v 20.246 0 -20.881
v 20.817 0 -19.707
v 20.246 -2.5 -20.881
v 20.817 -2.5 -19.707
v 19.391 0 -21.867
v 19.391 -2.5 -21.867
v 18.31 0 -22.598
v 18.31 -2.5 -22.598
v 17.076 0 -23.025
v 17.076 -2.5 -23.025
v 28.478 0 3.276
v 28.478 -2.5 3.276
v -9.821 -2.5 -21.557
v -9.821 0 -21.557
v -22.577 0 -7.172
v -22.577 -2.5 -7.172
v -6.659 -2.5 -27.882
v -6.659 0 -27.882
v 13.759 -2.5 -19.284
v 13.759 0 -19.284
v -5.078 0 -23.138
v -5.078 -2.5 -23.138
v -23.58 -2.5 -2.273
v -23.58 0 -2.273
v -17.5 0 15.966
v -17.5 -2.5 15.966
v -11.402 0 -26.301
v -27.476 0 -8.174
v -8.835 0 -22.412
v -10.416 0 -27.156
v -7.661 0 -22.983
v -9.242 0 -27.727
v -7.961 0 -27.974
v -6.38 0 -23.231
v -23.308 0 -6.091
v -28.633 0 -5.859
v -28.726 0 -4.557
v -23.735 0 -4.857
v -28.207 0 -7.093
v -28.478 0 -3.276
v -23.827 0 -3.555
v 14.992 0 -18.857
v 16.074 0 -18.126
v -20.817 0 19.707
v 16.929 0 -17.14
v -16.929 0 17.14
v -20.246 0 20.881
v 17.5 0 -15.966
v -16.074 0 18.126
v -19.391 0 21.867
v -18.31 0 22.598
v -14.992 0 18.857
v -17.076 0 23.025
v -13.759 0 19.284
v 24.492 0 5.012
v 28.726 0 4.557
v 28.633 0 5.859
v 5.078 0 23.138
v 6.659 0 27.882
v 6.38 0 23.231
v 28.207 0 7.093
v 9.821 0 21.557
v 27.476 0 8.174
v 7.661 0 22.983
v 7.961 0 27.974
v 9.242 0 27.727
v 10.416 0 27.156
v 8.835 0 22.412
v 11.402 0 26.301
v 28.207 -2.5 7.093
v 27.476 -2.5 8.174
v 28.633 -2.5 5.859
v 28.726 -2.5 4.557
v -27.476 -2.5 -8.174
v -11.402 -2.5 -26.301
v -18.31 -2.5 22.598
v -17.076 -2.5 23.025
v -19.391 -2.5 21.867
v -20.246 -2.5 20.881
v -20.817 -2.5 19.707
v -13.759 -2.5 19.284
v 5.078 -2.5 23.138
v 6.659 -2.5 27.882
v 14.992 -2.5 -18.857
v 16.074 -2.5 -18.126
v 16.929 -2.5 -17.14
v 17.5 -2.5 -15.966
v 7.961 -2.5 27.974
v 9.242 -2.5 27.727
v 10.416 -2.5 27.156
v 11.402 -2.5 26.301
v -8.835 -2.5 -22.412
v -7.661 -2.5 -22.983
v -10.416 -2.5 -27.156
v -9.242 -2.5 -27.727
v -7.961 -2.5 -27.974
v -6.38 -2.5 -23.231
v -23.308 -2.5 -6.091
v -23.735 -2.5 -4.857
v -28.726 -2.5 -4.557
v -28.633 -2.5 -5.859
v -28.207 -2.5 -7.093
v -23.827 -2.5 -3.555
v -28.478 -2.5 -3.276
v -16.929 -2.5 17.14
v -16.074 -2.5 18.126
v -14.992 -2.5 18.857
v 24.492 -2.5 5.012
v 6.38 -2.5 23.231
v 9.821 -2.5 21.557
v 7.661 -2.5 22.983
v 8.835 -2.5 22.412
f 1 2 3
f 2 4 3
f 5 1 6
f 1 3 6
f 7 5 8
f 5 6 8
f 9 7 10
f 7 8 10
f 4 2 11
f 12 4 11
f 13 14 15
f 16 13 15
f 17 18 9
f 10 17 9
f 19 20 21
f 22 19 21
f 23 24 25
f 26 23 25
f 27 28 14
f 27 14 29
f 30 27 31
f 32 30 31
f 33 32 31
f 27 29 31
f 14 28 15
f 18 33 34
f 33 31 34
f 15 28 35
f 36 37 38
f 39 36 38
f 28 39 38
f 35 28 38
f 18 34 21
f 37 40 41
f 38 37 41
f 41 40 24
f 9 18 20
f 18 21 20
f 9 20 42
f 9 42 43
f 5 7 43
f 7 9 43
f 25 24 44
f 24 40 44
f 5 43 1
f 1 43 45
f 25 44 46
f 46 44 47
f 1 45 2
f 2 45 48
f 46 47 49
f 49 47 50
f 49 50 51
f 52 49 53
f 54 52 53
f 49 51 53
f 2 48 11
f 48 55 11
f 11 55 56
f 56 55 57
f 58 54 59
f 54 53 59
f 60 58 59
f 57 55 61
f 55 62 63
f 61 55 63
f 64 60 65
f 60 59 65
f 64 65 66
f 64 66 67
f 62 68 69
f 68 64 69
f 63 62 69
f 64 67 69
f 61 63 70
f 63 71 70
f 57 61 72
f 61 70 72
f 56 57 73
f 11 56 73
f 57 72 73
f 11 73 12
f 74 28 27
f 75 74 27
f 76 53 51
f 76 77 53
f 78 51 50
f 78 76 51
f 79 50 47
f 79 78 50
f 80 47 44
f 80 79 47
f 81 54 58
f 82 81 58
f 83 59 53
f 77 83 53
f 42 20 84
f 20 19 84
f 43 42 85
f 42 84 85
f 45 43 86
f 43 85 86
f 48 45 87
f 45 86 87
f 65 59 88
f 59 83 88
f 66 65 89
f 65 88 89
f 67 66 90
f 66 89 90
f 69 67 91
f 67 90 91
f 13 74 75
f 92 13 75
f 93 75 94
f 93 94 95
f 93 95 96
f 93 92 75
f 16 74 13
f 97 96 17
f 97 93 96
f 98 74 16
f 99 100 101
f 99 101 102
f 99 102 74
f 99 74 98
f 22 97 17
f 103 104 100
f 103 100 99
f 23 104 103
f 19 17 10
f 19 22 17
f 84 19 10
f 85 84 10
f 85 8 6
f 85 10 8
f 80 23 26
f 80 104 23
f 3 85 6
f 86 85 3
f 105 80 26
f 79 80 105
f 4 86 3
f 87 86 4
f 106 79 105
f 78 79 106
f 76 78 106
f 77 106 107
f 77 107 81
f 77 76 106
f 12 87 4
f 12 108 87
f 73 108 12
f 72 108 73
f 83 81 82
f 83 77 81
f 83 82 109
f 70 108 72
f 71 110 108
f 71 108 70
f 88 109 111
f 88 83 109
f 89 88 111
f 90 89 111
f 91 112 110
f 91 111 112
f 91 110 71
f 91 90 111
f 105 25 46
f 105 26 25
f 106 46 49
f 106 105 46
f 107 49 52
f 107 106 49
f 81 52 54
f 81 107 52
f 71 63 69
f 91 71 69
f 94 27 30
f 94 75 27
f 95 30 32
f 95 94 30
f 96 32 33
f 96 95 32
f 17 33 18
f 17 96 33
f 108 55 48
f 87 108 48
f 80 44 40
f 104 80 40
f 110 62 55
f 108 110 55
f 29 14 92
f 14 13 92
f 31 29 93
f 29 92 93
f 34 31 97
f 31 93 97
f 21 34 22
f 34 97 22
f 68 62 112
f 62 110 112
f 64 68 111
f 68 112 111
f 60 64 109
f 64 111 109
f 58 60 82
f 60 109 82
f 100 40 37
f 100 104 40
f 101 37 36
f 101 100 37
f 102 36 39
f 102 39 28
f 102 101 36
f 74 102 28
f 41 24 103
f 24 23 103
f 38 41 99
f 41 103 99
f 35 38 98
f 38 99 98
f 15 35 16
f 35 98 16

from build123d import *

# Parameters (mm, degrees)
F1_DEPTH = 2.5
F2_R     = 5
F3_R     = 5


with BuildPart() as f1:
    # F0 (on Front) → F1 (new body)
    with BuildSketch(Plane.XZ):
        Polygon((9.486825, 28.460502), (-19.904105, 22.446082), (-29.39093, -6.014419), (-9.486825, -28.460502), (19.904105, -22.446082), (29.39093, 6.014419), align=None)
        Polygon((-16.586754, 18.705069), (7.905688, 23.717085), (24.492442, 5.012016), (16.586754, -18.705069), (-7.905688, -23.717085), (-24.492442, -5.012016), align=None, mode=Mode.SUBTRACT)
    extrude(amount=F1_DEPTH)

    # F2
    f2_edges = [f1.edges().sort_by_distance(p)[0] for p in [
        (-19.904105, -1.25, 22.446082),
        (9.486825, -1.25, 28.460502),
        (29.39093, -1.25, 6.014419),
        (19.904105, -1.25, -22.446082),
        (-9.486825, -1.25, -28.460502),
        (-29.39093, -1.25, -6.014419),
    ]]
    fillet(f2_edges, radius=F2_R)

    # F3
    f3_edges = [f1.edges().sort_by_distance(p)[0] for p in [
        (-24.492442, -1.25, -5.012016),
        (-7.905688, -1.25, -23.717085),
        (16.586754, -1.25, -18.705069),
        (7.905688, -1.25, 23.717085),
        (-16.586754, -1.25, 18.705069),
    ]]
    fillet(f3_edges, radius=F3_R)


solid = f1.part
